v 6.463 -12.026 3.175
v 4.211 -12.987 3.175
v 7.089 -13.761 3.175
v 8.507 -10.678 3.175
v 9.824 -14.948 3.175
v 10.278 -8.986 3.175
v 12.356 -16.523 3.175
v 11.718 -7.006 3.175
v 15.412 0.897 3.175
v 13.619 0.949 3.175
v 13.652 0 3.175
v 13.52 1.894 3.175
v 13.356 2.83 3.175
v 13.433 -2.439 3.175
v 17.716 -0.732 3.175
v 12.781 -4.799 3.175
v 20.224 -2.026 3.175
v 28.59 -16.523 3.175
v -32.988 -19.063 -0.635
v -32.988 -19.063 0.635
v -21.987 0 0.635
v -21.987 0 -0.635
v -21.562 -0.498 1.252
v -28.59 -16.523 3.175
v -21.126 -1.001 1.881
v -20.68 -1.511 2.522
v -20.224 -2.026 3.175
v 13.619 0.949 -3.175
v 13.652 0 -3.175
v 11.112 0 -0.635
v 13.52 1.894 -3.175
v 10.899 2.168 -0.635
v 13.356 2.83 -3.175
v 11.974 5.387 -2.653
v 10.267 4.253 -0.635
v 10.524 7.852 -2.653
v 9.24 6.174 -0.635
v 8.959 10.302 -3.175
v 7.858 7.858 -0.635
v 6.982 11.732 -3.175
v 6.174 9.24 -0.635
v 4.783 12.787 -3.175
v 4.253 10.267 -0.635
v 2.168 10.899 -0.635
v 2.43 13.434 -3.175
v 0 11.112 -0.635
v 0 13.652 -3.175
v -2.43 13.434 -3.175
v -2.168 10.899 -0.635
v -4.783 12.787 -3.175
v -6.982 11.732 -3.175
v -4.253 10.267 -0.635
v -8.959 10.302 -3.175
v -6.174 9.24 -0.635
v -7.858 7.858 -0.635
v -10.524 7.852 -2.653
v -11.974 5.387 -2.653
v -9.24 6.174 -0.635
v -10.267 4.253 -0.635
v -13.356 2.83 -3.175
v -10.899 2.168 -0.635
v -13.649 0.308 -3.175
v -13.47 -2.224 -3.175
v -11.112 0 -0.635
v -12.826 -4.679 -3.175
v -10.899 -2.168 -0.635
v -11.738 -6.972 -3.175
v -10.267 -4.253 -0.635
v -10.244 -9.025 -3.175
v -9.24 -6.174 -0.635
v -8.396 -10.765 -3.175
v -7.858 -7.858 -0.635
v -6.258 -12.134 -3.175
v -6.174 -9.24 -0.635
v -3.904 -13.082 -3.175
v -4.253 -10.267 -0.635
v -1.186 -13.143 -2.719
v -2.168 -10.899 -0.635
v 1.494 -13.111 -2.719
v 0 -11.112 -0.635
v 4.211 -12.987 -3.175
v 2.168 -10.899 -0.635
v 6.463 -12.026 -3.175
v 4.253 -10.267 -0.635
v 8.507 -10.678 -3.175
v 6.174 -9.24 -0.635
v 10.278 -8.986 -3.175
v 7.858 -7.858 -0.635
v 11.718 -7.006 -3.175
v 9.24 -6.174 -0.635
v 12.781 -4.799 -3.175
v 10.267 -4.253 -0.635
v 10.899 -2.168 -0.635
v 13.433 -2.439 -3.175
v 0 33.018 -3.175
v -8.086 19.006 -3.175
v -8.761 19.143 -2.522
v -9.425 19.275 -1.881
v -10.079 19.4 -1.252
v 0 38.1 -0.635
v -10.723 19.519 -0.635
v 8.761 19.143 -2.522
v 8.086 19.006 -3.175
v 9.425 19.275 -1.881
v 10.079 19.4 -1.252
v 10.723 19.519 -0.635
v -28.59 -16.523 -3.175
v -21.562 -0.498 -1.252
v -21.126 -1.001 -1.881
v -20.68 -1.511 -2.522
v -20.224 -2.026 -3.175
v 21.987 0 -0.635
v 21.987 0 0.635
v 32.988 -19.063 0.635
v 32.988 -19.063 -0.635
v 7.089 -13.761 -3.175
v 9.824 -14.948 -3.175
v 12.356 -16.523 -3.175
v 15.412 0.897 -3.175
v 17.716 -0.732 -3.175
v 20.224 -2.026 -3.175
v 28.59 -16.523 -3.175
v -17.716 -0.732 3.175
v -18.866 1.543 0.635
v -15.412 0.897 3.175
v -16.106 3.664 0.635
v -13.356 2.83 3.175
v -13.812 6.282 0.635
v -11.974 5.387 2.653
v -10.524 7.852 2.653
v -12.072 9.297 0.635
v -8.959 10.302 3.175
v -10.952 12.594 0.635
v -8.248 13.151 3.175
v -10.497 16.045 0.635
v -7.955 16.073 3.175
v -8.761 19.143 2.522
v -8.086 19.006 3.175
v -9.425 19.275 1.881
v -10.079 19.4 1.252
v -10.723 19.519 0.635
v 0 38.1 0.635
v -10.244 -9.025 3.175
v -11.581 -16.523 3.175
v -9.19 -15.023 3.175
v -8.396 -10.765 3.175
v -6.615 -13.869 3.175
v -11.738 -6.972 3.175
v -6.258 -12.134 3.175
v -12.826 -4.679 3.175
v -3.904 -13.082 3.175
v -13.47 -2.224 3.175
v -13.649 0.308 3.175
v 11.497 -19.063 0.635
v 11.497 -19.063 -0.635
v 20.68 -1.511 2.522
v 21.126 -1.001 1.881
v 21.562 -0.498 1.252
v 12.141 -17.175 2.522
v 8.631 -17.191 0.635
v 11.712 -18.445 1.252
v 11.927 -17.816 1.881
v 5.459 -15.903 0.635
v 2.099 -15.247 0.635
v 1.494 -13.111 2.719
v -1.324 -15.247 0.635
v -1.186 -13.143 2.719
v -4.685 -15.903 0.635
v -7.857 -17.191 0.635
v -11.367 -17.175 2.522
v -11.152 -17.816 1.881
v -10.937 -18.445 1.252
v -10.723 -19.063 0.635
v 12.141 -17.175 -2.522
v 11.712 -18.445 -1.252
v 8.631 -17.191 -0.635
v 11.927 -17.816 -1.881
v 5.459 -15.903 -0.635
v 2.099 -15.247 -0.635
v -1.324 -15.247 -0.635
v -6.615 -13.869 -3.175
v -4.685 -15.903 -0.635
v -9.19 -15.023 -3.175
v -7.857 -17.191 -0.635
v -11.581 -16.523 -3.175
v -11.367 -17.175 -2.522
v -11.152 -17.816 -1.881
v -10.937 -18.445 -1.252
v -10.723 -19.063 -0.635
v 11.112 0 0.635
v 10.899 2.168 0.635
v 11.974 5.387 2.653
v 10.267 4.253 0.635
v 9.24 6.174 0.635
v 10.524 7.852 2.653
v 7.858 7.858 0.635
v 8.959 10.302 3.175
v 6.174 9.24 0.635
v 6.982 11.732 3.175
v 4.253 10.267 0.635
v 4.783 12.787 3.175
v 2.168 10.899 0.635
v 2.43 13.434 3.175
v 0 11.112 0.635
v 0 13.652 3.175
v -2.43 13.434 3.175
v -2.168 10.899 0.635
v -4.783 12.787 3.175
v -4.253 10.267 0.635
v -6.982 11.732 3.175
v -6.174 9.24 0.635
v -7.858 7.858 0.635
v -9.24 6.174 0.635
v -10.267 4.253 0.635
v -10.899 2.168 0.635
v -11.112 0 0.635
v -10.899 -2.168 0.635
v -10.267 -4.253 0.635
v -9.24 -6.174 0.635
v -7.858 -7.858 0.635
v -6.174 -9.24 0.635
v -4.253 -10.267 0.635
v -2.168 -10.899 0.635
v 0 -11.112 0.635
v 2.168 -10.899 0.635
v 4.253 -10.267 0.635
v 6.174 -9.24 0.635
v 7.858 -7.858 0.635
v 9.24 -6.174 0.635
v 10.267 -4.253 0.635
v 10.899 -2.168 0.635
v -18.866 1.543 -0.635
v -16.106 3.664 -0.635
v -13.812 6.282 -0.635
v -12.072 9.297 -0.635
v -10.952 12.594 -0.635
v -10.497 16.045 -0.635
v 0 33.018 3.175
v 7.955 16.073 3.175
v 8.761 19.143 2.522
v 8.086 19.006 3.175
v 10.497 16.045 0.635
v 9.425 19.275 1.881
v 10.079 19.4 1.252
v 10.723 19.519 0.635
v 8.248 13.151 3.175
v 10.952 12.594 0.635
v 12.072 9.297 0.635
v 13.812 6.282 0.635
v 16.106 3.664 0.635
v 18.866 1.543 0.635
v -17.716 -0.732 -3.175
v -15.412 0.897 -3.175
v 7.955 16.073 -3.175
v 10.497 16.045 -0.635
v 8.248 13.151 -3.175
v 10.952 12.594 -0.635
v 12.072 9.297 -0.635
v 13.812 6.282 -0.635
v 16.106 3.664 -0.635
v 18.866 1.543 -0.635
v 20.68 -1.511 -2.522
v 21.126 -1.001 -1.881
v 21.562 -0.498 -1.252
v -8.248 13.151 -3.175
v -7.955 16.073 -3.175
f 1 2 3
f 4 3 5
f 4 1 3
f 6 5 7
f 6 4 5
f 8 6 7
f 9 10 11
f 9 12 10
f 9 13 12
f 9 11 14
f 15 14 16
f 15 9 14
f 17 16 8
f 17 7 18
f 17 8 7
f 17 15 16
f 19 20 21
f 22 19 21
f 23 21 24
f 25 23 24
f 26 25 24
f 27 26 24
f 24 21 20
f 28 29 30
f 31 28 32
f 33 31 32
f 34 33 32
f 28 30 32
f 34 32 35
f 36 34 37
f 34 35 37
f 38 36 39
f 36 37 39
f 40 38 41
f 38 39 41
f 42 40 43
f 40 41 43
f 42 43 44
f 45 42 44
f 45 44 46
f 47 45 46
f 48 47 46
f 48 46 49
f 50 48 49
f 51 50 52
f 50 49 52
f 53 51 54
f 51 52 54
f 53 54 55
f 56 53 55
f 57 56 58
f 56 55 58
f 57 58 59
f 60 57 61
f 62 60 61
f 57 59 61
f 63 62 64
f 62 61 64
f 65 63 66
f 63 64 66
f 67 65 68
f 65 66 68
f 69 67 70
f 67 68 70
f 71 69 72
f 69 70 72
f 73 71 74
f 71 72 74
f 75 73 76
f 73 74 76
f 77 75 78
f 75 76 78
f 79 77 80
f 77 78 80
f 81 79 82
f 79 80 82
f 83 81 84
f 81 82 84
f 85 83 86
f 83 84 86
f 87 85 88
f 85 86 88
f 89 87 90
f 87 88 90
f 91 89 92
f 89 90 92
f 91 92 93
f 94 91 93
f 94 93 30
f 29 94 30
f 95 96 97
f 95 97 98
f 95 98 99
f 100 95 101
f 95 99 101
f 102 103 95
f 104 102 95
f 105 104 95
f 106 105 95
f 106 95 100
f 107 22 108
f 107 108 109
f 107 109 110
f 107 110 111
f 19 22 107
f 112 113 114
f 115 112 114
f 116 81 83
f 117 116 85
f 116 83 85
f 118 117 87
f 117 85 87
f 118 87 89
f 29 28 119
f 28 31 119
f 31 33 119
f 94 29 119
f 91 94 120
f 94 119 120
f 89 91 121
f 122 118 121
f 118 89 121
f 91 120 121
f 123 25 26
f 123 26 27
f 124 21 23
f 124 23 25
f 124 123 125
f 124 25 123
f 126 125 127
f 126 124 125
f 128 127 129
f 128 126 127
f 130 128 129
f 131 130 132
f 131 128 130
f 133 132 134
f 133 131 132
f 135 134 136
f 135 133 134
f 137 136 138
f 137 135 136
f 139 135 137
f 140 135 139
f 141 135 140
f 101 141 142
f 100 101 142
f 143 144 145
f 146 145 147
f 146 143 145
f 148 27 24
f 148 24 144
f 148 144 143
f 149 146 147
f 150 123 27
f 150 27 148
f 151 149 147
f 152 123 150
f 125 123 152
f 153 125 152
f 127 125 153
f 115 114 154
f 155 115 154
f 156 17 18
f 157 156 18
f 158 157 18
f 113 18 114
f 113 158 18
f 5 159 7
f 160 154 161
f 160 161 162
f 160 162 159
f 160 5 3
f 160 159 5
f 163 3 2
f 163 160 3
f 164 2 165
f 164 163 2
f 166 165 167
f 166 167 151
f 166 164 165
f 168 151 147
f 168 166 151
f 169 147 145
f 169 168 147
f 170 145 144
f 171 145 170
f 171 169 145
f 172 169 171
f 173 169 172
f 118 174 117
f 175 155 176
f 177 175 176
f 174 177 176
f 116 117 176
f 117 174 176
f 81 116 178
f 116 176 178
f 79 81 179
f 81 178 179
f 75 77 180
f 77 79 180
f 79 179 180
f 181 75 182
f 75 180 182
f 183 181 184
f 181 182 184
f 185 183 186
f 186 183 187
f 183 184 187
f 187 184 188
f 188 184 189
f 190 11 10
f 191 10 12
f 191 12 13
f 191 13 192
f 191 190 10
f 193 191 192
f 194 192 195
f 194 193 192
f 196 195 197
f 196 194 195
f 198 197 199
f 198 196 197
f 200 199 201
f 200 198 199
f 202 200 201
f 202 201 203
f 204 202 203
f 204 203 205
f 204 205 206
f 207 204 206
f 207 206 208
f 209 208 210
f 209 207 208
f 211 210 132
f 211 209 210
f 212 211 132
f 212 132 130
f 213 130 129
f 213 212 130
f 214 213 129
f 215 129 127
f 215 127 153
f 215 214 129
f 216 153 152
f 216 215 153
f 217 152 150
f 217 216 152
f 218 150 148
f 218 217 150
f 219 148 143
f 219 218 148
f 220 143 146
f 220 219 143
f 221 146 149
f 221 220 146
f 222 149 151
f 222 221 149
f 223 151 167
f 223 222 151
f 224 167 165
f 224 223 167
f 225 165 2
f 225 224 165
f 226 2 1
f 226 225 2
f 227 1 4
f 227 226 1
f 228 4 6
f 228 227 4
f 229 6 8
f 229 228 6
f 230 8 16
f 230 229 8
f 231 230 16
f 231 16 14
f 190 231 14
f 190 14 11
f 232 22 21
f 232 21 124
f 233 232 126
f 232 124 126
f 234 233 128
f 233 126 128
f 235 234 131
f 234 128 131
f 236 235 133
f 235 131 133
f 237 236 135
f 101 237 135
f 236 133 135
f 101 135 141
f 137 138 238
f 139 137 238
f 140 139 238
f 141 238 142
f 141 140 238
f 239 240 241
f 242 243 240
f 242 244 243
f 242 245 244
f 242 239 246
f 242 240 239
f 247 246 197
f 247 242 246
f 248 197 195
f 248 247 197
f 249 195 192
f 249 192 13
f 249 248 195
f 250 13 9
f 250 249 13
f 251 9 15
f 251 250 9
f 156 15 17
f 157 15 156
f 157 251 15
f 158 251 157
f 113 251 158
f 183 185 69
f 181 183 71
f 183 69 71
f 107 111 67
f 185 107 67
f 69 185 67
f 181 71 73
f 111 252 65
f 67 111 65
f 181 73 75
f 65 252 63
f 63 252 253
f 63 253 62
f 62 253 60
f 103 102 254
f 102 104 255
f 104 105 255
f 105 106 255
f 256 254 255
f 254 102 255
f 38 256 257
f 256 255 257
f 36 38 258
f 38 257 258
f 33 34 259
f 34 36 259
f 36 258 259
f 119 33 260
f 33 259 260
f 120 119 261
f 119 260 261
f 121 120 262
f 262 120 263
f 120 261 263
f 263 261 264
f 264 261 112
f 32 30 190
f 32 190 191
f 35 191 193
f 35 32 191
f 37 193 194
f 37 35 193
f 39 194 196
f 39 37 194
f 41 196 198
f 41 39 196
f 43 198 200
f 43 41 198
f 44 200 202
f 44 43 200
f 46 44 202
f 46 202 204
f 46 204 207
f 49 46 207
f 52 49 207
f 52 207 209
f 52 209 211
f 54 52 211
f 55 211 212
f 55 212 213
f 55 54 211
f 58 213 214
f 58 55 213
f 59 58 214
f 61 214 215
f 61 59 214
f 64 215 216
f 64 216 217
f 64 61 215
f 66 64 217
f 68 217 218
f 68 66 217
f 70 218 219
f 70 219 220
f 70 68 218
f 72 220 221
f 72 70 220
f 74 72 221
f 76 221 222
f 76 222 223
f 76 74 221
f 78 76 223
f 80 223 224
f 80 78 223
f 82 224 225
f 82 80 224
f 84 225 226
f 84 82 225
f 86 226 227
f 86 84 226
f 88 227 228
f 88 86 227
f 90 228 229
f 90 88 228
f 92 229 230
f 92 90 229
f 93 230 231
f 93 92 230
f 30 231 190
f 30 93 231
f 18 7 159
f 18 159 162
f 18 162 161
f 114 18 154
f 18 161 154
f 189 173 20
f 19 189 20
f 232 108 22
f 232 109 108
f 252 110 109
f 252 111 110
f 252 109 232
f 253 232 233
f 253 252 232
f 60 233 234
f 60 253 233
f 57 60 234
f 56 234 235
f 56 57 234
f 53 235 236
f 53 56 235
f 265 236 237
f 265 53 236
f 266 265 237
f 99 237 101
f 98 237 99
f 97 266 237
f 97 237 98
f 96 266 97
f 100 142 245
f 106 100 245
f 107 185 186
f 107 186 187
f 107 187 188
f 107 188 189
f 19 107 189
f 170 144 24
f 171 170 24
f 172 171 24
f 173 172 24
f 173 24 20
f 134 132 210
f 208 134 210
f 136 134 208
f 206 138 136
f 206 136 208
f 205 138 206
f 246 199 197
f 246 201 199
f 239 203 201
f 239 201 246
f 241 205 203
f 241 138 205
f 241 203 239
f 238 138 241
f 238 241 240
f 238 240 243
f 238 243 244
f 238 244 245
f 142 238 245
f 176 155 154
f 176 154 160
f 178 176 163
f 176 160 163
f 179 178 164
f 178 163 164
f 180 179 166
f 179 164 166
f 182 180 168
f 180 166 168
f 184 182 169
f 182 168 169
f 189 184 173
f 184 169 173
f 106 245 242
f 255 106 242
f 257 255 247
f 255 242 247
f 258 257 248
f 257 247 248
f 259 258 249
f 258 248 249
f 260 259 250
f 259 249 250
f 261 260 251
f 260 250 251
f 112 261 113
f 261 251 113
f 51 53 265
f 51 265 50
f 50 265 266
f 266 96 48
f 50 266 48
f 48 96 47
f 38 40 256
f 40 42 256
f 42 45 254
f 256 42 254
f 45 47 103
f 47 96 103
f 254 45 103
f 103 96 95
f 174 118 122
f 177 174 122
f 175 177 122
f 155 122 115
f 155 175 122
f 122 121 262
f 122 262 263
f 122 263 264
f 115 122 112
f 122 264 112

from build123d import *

# Parameters (mm, degrees)
F0_R          = 38.1
F0_R_2        = 11.1125
F1_DEPTH      = 3.175
F1_DEPTH_BACK = 3.175
F3_DEPTH      = 25.4
F5_DEPTH      = 25.4
F6_T1_DEPTH   = 34.5170750052
F6_T3_DEPTH   = 35.0734141938
F6_T5_DEPTH   = 34.5549539208
F6_T7_DEPTH   = 35.3294952256
F6_T9_DEPTH   = 35.0734141938
F6_T11_DEPTH  = 34.5170750052
F6_T14_ANGLE  = 120.7671426779
F6_T16_ANGLE  = 119.4565466951
F6_T18_ANGLE  = 120.7671426779
F6_T22_ANGLE  = 120.7671426779
F6_T24_ANGLE  = 119.4565466951
F6_T26_ANGLE  = 120.7671426779


# Not quite as in the source:
# - a fillet or chamfer that OpenCascade refuses, or shapes differently, is made with other operations: its cross-section is extruded or revolved along the edge and cut away or added


with BuildPart() as f1:
    # F0 (on Top) → F1 (new body, two sides)
    with BuildSketch(Plane.XY) as f1_sk:
        Circle(F0_R)
        Circle(F0_R_2, mode=Mode.SUBTRACT)
    extrude(amount=F1_DEPTH)
    extrude(f1_sk.sketch, amount=-F1_DEPTH_BACK)

    # F2 (on face) → F3 (cut)
    with BuildSketch(Plane.XY.offset(3.175)):
        with BuildLine():
            Line((-32.9882322762, -19.0627), (0, 38.1))
            ThreePointArc((0, 38.1), (-32.9992338547, 19.0436489413), (-32.9882322762, -19.0627))
        make_face()
        with BuildLine():
            Line((32.9882322762, -19.0627), (-32.9882322762, -19.0627))
            ThreePointArc((-32.9882322762, -19.0627), (0, -38.1), (32.9882322762, -19.0627))
        make_face()
        with BuildLine():
            ThreePointArc((38.1, 0), (26.9407683632, 26.9407683632), (0, 38.1))
            Line((0, 38.1), (32.9882322762, -19.0627))
            ThreePointArc((32.9882322762, -19.0627), (36.7998753376, -9.8680887277), (38.1, 0))
        make_face()
    extrude(amount=-F3_DEPTH, mode=Mode.SUBTRACT)

    # F4 (on face) → F5 (cut)
    with BuildSketch(Plane.XY.offset(3.175)):
        with BuildLine():
            Line((-10.7228866295, 19.5191574013), (-21.9872687911, 0))
            ThreePointArc((-21.9872687911, 0), (-12.8675975863, 7.7469760001), (-10.7228866295, 19.5191574013))
        make_face()
        with BuildLine():
            Line((21.9872687911, 0), (10.7228866295, 19.5191574013))
            ThreePointArc((10.7228866295, 19.5191574013), (12.8675975863, 7.7469760001), (21.9872687911, 0))
        make_face()
        with BuildLine():
            ThreePointArc((11.4974279343, -19.0627), (0.3872706524, -15.1640834027), (-10.7228866295, -19.0627))
            Line((-10.7228866295, -19.0627), (11.4974279343, -19.0627))
        make_face()
    extrude(amount=-F5_DEPTH, mode=Mode.SUBTRACT)

    # F6: chamfer of 2.54 on 20 edges, made by hand

    # F6_s2 → F6_t1 (cut)
    with BuildSketch(Plane(origin=(-19.7590646722, 34.2389212213, 0), x_dir=(0, 0, 1), z_dir=(0.4998333055, -0.8661216235, 0))):
        Polygon((3.175, -16.5036489413), (0.635, -19.0436489413), (3.175, -19.0436489413), align=None)
        Polygon((-3.175, -16.5036489413), (-0.635, -19.0436489413), (-3.175, -19.0436489413), align=None)
    extrude(amount=F6_T1_DEPTH, mode=Mode.SUBTRACT)

    # F6_s4 → F6_t3 (cut)
    with BuildSketch(Plane(origin=(2.2282041189, -3.8610787787, 0), x_dir=(0, 0, 1), z_dir=(0.4998333055, -0.8661216235, 0))):
        Polygon((3.175, -16.5036489413), (0.635, -19.0436489413), (3.175, -19.0436489413), align=None)
        Polygon((-3.175, -16.5036489413), (-0.635, -19.0436489413), (-3.175, -19.0436489413), align=None)
    extrude(amount=F6_T3_DEPTH, mode=Mode.SUBTRACT)

    # F6_s6 → F6_t5 (cut)
    with BuildSketch(Plane.YZ.offset(4.9653531448)):
        Polygon((-16.5227, 3.175), (-19.0627, 0.635), (-19.0627, 3.175), align=None)
        Polygon((-16.5227, -3.175), (-19.0627, -0.635), (-19.0627, -3.175), align=None)
    extrude(amount=F6_T5_DEPTH, mode=Mode.SUBTRACT)

    # F6_s8 → F6_t7 (cut)
    with BuildSketch(Plane.YZ.offset(-39.5203070657)):
        Polygon((-16.5227, 3.175), (-19.0627, 0.635), (-19.0627, 3.175), align=None)
        Polygon((-16.5227, -3.175), (-19.0627, -0.635), (-19.0627, -3.175), align=None)
    extrude(amount=F6_T7_DEPTH, mode=Mode.SUBTRACT)

    # F6_s10 → F6_t9 (cut)
    with BuildSketch(Plane(origin=(-19.7590646722, -34.2389212213, 0), x_dir=(0, 0, 1), z_dir=(0.4998333055, 0.8661216235, 0))):
        Polygon((0.635, -19.0436489413), (3.175, -16.5036489413), (3.175, -19.0436489413), align=None)
        Polygon((-0.635, -19.0436489413), (-3.175, -16.5036489413), (-3.175, -19.0436489413), align=None)
    extrude(amount=F6_T9_DEPTH, mode=Mode.SUBTRACT)

    # F6_s12 → F6_t11 (cut)
    with BuildSketch(Plane(origin=(2.5062809746, 4.3429361799, 0), x_dir=(0, 0, 1), z_dir=(0.4998333055, 0.8661216235, 0))):
        Polygon((3.175, -16.5036489413), (0.635, -19.0436489413), (3.175, -19.0436489413), align=None)
        Polygon((-3.175, -16.5036489413), (-0.635, -19.0436489413), (-3.175, -19.0436489413), align=None)
    extrude(amount=F6_T11_DEPTH, mode=Mode.SUBTRACT)

    # F6_s13 → F6_t14 (revolve, cut)
    with BuildSketch(Plane(origin=(14.4954043102, 24.71215529, 0), x_dir=(0, 0, 1), z_dir=(0.505952459, 0.8625613655, 0))):
        Polygon((3.175, -4.353790183), (0.635, -1.813790183), (3.175, -1.813790183), align=None)
    revolve(axis=Axis((28.2672400519, 16.6340121728, 3.175), (0, 0, 1)), revolution_arc=F6_T14_ANGLE, mode=Mode.SUBTRACT)

    # F6_s15 → F6_t16 (revolve, cut)
    with BuildSketch(Plane(origin=(14.4410953434, -24.7409917864, 0), x_dir=(0, 0, 1), z_dir=(0.5041015086, -0.8636444112, 0))):
        Polygon((3.175, -4.0473019905), (0.635, -1.5073019905), (3.175, -1.5073019905), align=None)
    revolve(axis=Axis((0.3872706524, -32.9440834027, 3.175), (0, 0, 1)), revolution_arc=F6_T16_ANGLE, mode=Mode.SUBTRACT)

    # F6_s17 → F6_t18 (revolve, cut)
    with BuildSketch(Plane(origin=(-28.374198152, 0.1844947944, 0), x_dir=(0, 0, 1), z_dir=(-0.9999788613, 0.0065020655, 0))):
        Polygon((3.175, -3.8701348937), (0.635, -1.3301348937), (3.175, -1.3301348937), align=None)
    revolve(axis=Axis((-28.2672400519, 16.6340121728, 3.175), (0, 0, 1)), revolution_arc=F6_T18_ANGLE, mode=Mode.SUBTRACT)

    # F6_s19 → F6_t20 (revolve, cut)
    with BuildSketch(Plane.XZ):
        Polygon((13.6525, 3.175), (11.1125, 0.635), (11.1125, 3.175), align=None)
    revolve(axis=Axis((0, 0, 3.175), (0, 0, 1)), mode=Mode.SUBTRACT)

    # F6_s21 → F6_t22 (revolve, cut)
    with BuildSketch(Plane(origin=(14.4954043102, 24.71215529, 0), x_dir=(0, 0, 1), z_dir=(0.505952459, 0.8625613655, 0))):
        Polygon((-3.175, -4.353790183), (-0.635, -1.813790183), (-3.175, -1.813790183), align=None)
    revolve(axis=Axis((28.2672400519, 16.6340121728, -3.175), (0, 0, 1)), revolution_arc=F6_T22_ANGLE, mode=Mode.SUBTRACT)

    # F6_s23 → F6_t24 (revolve, cut)
    with BuildSketch(Plane(origin=(14.4410953434, -24.7409917864, 0), x_dir=(0, 0, 1), z_dir=(0.5041015086, -0.8636444112, 0))):
        Polygon((-3.175, -4.0473019905), (-0.635, -1.5073019905), (-3.175, -1.5073019905), align=None)
    revolve(axis=Axis((0.3872706524, -32.9440834027, -3.175), (0, 0, 1)), revolution_arc=F6_T24_ANGLE, mode=Mode.SUBTRACT)

    # F6_s25 → F6_t26 (revolve, cut)
    with BuildSketch(Plane(origin=(-28.374198152, 0.1844947944, 0), x_dir=(0, 0, 1), z_dir=(-0.9999788613, 0.0065020655, 0))):
        Polygon((-0.635, -1.3301348937), (-3.175, -3.8701348937), (-3.175, -1.3301348937), align=None)
    revolve(axis=Axis((-28.2672400519, 16.6340121728, -3.175), (0, 0, 1)), revolution_arc=F6_T26_ANGLE, mode=Mode.SUBTRACT)

    # F6_s27 → F6_t28 (revolve, cut)
    with BuildSketch(Plane.XZ):
        Polygon((13.6525, -3.175), (11.1125, -0.635), (11.1125, -3.175), align=None)
    revolve(axis=Axis((0, 0, -3.175), (0, 0, 1)), mode=Mode.SUBTRACT)


solid = f1.part
